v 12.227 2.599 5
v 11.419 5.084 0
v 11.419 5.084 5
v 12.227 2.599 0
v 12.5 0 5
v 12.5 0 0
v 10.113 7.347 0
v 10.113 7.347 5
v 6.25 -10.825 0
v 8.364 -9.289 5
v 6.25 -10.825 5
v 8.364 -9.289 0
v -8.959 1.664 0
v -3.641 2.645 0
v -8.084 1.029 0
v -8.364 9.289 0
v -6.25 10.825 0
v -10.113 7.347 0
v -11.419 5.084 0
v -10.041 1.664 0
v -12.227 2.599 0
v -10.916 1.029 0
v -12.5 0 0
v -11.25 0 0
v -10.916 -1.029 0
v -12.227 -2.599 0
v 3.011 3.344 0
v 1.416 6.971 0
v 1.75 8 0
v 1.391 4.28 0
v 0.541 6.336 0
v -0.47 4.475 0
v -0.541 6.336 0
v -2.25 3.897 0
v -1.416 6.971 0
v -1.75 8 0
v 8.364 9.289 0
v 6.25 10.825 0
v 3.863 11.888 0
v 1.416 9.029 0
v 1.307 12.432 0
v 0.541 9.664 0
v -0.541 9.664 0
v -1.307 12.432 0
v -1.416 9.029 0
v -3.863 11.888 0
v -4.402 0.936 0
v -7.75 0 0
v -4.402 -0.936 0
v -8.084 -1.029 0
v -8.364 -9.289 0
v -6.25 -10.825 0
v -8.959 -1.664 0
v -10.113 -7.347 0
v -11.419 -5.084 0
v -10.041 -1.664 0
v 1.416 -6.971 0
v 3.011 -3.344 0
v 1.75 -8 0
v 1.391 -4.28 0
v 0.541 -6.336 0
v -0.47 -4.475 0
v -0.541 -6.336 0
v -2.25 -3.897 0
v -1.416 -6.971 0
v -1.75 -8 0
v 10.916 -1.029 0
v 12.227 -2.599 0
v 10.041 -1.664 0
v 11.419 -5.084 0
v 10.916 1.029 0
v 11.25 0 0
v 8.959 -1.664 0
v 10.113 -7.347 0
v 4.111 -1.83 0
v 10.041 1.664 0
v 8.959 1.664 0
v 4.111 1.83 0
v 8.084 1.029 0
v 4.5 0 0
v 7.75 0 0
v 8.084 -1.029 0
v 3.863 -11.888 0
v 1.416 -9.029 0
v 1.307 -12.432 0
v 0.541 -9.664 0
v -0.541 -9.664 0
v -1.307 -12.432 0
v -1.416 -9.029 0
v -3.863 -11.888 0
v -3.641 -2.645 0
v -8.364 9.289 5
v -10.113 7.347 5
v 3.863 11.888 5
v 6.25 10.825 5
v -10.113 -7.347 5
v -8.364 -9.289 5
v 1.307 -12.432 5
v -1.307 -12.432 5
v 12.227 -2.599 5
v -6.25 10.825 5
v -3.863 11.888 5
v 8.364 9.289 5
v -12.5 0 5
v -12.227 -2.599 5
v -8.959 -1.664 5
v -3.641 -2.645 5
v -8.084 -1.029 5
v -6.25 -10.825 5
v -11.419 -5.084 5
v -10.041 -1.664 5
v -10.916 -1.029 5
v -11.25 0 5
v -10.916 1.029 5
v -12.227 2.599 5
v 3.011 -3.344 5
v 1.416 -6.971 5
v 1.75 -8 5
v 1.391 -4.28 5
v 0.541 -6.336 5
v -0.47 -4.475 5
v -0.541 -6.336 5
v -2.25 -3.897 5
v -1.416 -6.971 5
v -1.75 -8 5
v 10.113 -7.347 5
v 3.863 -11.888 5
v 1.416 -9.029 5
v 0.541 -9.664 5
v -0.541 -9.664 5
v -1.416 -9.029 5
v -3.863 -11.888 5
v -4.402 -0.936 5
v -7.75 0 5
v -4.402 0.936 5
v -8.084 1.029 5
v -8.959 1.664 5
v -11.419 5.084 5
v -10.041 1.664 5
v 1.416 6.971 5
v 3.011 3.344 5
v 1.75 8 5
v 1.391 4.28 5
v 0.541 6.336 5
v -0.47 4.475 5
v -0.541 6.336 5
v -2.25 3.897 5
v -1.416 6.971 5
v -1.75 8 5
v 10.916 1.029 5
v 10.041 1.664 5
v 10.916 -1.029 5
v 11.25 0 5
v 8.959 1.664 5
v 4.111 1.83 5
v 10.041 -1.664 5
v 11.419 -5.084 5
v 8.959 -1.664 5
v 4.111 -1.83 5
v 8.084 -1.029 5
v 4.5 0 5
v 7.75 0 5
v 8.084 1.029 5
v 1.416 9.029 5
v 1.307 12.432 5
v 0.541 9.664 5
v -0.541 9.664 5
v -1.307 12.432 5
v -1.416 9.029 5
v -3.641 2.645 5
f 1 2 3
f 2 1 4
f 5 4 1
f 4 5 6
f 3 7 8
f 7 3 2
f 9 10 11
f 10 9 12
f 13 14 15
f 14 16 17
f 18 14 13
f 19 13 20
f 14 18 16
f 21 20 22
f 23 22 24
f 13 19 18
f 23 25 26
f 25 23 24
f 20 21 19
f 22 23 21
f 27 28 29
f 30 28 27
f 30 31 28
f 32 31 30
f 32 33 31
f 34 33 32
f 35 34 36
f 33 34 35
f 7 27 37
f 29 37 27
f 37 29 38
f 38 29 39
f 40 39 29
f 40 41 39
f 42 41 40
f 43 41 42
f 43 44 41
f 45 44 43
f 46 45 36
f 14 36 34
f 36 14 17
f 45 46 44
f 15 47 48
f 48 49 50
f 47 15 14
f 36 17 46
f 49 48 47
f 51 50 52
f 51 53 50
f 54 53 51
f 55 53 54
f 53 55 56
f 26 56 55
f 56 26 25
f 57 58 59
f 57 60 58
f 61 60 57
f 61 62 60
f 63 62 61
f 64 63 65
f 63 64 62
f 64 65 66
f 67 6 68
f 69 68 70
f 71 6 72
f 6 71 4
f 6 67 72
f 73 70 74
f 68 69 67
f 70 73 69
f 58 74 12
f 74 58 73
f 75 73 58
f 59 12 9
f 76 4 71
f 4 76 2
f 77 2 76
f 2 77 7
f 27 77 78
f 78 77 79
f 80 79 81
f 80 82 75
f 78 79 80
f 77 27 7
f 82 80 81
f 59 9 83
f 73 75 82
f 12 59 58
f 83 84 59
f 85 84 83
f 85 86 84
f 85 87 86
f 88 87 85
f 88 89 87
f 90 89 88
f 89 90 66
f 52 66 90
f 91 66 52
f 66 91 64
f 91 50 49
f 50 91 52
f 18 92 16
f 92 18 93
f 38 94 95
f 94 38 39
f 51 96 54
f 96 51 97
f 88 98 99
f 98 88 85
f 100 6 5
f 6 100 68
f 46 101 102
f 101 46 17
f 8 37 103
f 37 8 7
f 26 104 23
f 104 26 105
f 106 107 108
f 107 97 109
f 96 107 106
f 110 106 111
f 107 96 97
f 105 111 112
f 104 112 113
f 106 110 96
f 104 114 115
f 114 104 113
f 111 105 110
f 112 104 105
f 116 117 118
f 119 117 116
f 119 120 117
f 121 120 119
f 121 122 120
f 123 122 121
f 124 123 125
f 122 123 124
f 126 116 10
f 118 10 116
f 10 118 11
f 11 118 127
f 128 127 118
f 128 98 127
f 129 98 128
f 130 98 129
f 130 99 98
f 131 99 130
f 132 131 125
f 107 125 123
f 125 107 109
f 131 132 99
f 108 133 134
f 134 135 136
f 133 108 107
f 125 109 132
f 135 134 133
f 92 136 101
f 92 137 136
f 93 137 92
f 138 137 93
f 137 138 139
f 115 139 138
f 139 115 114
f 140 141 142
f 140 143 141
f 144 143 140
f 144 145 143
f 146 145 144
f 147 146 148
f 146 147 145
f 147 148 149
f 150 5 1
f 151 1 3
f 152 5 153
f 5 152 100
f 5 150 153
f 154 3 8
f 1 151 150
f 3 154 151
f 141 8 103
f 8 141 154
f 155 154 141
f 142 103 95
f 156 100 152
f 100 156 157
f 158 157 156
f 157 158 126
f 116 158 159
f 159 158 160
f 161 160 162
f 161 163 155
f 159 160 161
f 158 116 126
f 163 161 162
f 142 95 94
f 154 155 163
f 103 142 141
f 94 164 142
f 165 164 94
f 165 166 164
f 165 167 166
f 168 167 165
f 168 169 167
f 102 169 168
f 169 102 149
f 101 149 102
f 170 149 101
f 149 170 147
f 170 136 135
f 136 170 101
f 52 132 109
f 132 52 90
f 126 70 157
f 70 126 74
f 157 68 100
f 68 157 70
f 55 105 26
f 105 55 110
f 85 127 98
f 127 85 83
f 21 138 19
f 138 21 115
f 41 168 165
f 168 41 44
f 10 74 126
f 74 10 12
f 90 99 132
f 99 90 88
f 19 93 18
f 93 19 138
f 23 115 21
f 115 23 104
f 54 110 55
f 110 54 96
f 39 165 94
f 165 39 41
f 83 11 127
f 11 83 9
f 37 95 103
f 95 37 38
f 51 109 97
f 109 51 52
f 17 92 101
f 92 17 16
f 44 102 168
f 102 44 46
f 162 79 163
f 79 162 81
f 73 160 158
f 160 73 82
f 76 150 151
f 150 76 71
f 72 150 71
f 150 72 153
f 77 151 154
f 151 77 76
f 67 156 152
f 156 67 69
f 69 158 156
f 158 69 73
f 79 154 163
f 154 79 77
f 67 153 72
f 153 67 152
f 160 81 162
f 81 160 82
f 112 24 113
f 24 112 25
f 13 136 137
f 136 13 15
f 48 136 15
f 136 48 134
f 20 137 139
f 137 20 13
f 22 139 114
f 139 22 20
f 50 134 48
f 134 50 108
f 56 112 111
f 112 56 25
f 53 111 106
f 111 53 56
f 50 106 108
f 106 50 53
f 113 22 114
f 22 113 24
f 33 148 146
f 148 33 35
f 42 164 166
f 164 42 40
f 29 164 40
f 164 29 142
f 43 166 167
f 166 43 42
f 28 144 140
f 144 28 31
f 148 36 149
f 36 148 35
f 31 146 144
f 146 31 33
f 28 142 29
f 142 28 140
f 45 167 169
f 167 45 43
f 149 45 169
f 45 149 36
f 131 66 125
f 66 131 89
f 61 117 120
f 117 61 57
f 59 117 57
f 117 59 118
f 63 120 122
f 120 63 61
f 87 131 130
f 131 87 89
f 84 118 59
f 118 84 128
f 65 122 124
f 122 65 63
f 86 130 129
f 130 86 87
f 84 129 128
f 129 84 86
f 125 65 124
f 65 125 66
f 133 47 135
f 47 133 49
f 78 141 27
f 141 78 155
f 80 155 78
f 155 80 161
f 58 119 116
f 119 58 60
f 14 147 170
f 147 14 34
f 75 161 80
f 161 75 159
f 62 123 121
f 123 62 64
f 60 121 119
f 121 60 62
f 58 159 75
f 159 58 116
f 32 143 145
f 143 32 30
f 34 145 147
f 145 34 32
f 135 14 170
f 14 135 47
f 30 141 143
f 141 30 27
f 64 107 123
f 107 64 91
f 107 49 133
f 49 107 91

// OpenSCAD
difference () {
    cylinder(d=25,h=5);
    translate([19/2,0,0])
    cylinder(d=3.5, h = 5,$fn=10);
    translate([-19/2,0,0])
    cylinder(d=3.5, h = 5,$fn=10);
    translate([0,16/2,0])
    cylinder(d=3.5, h = 5,$fn=10);
    translate([0,-16/2,0])
    cylinder(d=3.5, h = 5,$fn=10);
    cylinder(d = 9, h = 5);
}
